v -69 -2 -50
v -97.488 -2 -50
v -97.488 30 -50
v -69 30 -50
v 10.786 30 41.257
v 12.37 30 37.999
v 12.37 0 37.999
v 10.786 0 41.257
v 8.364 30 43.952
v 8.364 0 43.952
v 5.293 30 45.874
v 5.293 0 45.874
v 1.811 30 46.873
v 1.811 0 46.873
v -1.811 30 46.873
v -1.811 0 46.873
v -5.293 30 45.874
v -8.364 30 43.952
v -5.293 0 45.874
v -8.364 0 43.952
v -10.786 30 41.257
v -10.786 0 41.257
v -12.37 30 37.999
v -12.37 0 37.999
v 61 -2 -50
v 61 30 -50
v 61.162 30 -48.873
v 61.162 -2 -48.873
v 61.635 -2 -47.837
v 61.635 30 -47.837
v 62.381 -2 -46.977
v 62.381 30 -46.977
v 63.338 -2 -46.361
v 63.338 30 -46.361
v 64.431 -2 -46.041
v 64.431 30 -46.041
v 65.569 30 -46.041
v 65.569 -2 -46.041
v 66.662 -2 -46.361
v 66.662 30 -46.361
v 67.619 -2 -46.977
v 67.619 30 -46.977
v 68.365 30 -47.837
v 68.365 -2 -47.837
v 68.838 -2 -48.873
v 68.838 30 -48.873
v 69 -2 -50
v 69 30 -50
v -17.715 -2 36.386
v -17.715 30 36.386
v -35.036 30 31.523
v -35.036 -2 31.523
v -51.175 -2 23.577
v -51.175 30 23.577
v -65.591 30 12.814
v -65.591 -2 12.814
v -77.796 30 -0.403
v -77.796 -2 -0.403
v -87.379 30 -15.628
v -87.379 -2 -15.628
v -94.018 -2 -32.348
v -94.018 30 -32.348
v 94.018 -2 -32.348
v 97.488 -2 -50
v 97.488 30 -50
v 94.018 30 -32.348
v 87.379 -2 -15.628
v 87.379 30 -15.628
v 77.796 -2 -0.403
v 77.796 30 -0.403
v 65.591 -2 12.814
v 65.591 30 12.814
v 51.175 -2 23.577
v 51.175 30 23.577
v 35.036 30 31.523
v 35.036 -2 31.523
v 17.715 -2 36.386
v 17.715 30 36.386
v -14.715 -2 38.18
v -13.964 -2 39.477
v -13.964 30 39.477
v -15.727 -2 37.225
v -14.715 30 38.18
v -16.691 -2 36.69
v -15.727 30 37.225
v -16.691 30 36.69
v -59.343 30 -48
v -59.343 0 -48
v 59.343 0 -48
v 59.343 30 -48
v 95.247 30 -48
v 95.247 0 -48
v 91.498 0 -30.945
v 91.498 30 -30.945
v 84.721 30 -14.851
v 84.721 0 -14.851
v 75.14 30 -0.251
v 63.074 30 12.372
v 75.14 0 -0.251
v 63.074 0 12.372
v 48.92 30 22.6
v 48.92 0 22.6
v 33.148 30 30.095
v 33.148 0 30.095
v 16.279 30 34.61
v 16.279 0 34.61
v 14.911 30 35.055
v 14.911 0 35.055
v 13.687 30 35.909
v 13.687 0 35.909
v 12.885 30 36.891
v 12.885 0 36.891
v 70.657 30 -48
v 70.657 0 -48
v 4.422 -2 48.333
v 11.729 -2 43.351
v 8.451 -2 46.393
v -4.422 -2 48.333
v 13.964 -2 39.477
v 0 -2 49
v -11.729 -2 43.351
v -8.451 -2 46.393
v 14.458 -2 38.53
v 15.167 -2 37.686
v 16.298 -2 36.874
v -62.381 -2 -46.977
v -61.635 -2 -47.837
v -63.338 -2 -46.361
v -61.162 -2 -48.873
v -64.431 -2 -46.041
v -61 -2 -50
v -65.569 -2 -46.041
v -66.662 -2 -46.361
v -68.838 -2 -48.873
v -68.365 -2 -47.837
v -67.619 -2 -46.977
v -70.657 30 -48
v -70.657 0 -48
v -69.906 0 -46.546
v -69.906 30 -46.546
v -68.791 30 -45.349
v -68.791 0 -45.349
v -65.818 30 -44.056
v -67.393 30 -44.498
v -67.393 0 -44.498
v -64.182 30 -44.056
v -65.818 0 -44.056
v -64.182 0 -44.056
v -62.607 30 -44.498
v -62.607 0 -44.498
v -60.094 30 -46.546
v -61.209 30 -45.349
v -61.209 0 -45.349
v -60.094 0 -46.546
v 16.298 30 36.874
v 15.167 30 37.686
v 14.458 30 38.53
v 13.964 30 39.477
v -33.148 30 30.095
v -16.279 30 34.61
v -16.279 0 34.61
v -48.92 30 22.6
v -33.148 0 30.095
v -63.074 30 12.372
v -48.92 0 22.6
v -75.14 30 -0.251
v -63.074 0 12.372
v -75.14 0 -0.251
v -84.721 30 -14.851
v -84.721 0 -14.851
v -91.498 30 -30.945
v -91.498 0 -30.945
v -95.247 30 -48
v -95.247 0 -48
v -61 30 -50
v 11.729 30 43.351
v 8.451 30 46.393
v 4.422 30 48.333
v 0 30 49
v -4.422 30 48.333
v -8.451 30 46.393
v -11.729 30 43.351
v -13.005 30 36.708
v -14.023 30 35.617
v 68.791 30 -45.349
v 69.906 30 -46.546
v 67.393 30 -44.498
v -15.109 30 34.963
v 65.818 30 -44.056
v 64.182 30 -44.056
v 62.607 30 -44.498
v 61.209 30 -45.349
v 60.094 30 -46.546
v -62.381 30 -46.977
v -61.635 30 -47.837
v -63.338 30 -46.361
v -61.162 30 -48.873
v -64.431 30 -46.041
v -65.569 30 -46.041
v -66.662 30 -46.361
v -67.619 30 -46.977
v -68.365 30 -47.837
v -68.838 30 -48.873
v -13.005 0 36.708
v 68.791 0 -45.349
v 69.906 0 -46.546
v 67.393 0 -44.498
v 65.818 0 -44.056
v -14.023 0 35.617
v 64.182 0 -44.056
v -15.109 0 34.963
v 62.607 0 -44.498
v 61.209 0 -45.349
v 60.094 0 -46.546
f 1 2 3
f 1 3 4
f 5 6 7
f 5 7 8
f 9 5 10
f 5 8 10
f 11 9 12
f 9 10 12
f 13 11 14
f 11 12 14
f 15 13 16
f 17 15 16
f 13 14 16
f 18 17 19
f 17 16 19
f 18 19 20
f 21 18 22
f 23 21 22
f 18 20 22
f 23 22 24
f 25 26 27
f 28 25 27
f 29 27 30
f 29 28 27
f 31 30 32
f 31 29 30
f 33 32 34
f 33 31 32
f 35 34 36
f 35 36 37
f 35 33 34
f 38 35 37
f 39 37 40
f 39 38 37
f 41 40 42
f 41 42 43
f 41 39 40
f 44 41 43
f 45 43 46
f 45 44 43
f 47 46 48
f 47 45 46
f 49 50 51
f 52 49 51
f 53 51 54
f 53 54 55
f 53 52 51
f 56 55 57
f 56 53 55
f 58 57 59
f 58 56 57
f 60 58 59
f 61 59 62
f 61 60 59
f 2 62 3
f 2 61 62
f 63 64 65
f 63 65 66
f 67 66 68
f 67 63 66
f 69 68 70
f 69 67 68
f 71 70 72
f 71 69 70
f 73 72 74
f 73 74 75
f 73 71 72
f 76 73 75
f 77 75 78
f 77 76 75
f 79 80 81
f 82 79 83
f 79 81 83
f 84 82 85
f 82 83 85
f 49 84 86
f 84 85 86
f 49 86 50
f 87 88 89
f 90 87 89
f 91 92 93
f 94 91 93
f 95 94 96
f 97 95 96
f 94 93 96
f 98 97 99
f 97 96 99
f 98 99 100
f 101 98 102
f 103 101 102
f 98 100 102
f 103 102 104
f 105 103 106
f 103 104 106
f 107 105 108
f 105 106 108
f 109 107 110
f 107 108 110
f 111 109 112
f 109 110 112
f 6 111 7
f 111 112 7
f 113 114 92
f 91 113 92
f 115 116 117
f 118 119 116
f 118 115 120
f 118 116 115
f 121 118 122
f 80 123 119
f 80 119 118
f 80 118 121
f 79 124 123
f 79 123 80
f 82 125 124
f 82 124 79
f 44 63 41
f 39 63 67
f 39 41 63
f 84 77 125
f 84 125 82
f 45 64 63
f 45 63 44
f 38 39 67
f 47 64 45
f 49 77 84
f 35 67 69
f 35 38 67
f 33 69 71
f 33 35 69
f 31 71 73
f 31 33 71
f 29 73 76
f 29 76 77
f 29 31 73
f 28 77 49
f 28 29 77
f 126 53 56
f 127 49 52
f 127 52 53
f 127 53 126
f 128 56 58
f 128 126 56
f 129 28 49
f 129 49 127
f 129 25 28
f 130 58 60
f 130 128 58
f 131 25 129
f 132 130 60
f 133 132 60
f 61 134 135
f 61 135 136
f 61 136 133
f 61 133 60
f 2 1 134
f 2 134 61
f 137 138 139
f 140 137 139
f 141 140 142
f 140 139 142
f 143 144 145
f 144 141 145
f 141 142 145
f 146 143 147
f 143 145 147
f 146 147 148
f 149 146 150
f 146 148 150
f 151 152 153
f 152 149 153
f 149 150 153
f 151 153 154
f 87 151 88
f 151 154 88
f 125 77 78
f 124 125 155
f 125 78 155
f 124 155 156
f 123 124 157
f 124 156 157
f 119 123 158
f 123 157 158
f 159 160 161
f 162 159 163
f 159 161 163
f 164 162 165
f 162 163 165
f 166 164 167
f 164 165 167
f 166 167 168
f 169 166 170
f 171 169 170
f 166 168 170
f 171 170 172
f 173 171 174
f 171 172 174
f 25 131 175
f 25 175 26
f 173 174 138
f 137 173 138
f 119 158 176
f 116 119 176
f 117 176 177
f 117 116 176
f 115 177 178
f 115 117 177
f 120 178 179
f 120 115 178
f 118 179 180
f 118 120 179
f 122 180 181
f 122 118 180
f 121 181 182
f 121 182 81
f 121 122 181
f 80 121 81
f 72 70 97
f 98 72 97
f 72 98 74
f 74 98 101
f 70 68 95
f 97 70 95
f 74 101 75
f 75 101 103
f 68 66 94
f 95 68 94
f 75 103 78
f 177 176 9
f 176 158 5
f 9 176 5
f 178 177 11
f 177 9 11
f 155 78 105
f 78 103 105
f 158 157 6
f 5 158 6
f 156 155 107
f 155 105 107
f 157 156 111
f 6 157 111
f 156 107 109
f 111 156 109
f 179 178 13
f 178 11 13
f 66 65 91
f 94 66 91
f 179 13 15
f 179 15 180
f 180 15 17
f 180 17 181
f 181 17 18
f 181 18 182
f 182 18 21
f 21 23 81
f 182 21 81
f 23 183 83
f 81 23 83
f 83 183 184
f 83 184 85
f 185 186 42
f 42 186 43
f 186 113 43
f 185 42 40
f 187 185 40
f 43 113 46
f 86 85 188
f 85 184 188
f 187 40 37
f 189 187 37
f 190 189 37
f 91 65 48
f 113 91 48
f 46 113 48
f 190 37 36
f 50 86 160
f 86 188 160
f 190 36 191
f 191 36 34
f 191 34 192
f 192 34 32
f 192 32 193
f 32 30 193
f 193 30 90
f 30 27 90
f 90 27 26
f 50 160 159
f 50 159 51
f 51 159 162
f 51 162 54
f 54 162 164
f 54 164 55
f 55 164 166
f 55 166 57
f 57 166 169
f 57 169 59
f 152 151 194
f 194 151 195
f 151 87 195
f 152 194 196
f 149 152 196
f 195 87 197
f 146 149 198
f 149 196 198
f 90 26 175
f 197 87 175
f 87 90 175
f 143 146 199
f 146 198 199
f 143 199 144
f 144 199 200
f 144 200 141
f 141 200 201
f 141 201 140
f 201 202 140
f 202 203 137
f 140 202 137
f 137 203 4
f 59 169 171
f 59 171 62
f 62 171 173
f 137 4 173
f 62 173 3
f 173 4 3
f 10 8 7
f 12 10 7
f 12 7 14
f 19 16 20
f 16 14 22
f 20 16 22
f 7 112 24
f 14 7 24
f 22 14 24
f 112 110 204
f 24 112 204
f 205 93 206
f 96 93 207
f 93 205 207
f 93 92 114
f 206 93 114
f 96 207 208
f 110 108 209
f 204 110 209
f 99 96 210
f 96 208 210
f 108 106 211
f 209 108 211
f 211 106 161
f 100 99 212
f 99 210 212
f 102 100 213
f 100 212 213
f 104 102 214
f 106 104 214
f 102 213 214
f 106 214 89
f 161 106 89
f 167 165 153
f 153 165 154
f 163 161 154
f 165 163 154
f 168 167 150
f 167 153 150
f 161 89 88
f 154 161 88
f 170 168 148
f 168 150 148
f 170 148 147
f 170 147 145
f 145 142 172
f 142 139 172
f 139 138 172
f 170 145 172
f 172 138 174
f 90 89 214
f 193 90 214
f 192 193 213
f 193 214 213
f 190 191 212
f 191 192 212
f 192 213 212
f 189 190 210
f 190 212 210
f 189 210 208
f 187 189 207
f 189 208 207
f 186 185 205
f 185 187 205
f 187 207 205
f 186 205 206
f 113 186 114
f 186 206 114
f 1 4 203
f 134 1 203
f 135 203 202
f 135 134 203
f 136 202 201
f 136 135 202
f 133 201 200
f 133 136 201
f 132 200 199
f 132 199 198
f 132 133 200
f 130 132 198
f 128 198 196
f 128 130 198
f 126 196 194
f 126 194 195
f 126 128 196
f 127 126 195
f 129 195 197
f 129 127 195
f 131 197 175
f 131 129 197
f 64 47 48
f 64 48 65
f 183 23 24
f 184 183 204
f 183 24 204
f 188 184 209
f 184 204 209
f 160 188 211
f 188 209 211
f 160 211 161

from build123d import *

# Parameters (mm, degrees)
EXTRUDE_START   = -2
EXTRUDE_1_DEPTH = 32
SHELL_1_T       = -2
FILLET_1_R      = 5


with BuildPart() as part:
    # 草图1 → 凸台-拉伸1 (new body)
    with BuildSketch(Plane(origin=(0, 0, 0), x_dir=(1, 0, 0), z_dir=(0, 1, 0)).offset(EXTRUDE_START)):
        with BuildLine():
            Line((-97.488460856, 50), (-69, 50))
            ThreePointArc((-69, 50), (-65, 46), (-61, 50))
            Line((-61, 50), (-7.5, 50))
            Line((-7.5, 50), (7.5, 50))
            Line((7.5, 50), (61, 50))
            ThreePointArc((61, 50), (65, 46), (69, 50))
            Line((69, 50), (97.488460856, 50))
            ThreePointArc((97.488460856, 50), (70.958011296, -7.594087263), (14.719298061, -36.888297872))
            ThreePointArc((14.719298061, -36.888297872), (0, -49), (-14.719298061, -36.888297872))
            ThreePointArc((-14.719298061, -36.888297872), (-70.958011296, -7.594087263), (-97.488460856, 50))
        make_face()
    extrude(amount=EXTRUDE_1_DEPTH)

    # 抽壳1
    shell_1_openings = [part.faces().sort_by_distance(p)[0] for p in [
        (0, 30, -11.801216643),
    ]]
    offset(amount=SHELL_1_T, openings=shell_1_openings, kind=Kind.INTERSECTION)

    # 圆角1
    fillet_1_edges = [part.edges().sort_by_distance(p)[0] for p in [
        (14.719298061, 14, 36.888297872),
        (-14.719298061, 14, 36.888297872),
        (-12.951461384, 15, 35.122340426),
        (12.951461384, 15, 35.122340426),
    ]]
    fillet(fillet_1_edges, radius=FILLET_1_R)


solid = part.part
